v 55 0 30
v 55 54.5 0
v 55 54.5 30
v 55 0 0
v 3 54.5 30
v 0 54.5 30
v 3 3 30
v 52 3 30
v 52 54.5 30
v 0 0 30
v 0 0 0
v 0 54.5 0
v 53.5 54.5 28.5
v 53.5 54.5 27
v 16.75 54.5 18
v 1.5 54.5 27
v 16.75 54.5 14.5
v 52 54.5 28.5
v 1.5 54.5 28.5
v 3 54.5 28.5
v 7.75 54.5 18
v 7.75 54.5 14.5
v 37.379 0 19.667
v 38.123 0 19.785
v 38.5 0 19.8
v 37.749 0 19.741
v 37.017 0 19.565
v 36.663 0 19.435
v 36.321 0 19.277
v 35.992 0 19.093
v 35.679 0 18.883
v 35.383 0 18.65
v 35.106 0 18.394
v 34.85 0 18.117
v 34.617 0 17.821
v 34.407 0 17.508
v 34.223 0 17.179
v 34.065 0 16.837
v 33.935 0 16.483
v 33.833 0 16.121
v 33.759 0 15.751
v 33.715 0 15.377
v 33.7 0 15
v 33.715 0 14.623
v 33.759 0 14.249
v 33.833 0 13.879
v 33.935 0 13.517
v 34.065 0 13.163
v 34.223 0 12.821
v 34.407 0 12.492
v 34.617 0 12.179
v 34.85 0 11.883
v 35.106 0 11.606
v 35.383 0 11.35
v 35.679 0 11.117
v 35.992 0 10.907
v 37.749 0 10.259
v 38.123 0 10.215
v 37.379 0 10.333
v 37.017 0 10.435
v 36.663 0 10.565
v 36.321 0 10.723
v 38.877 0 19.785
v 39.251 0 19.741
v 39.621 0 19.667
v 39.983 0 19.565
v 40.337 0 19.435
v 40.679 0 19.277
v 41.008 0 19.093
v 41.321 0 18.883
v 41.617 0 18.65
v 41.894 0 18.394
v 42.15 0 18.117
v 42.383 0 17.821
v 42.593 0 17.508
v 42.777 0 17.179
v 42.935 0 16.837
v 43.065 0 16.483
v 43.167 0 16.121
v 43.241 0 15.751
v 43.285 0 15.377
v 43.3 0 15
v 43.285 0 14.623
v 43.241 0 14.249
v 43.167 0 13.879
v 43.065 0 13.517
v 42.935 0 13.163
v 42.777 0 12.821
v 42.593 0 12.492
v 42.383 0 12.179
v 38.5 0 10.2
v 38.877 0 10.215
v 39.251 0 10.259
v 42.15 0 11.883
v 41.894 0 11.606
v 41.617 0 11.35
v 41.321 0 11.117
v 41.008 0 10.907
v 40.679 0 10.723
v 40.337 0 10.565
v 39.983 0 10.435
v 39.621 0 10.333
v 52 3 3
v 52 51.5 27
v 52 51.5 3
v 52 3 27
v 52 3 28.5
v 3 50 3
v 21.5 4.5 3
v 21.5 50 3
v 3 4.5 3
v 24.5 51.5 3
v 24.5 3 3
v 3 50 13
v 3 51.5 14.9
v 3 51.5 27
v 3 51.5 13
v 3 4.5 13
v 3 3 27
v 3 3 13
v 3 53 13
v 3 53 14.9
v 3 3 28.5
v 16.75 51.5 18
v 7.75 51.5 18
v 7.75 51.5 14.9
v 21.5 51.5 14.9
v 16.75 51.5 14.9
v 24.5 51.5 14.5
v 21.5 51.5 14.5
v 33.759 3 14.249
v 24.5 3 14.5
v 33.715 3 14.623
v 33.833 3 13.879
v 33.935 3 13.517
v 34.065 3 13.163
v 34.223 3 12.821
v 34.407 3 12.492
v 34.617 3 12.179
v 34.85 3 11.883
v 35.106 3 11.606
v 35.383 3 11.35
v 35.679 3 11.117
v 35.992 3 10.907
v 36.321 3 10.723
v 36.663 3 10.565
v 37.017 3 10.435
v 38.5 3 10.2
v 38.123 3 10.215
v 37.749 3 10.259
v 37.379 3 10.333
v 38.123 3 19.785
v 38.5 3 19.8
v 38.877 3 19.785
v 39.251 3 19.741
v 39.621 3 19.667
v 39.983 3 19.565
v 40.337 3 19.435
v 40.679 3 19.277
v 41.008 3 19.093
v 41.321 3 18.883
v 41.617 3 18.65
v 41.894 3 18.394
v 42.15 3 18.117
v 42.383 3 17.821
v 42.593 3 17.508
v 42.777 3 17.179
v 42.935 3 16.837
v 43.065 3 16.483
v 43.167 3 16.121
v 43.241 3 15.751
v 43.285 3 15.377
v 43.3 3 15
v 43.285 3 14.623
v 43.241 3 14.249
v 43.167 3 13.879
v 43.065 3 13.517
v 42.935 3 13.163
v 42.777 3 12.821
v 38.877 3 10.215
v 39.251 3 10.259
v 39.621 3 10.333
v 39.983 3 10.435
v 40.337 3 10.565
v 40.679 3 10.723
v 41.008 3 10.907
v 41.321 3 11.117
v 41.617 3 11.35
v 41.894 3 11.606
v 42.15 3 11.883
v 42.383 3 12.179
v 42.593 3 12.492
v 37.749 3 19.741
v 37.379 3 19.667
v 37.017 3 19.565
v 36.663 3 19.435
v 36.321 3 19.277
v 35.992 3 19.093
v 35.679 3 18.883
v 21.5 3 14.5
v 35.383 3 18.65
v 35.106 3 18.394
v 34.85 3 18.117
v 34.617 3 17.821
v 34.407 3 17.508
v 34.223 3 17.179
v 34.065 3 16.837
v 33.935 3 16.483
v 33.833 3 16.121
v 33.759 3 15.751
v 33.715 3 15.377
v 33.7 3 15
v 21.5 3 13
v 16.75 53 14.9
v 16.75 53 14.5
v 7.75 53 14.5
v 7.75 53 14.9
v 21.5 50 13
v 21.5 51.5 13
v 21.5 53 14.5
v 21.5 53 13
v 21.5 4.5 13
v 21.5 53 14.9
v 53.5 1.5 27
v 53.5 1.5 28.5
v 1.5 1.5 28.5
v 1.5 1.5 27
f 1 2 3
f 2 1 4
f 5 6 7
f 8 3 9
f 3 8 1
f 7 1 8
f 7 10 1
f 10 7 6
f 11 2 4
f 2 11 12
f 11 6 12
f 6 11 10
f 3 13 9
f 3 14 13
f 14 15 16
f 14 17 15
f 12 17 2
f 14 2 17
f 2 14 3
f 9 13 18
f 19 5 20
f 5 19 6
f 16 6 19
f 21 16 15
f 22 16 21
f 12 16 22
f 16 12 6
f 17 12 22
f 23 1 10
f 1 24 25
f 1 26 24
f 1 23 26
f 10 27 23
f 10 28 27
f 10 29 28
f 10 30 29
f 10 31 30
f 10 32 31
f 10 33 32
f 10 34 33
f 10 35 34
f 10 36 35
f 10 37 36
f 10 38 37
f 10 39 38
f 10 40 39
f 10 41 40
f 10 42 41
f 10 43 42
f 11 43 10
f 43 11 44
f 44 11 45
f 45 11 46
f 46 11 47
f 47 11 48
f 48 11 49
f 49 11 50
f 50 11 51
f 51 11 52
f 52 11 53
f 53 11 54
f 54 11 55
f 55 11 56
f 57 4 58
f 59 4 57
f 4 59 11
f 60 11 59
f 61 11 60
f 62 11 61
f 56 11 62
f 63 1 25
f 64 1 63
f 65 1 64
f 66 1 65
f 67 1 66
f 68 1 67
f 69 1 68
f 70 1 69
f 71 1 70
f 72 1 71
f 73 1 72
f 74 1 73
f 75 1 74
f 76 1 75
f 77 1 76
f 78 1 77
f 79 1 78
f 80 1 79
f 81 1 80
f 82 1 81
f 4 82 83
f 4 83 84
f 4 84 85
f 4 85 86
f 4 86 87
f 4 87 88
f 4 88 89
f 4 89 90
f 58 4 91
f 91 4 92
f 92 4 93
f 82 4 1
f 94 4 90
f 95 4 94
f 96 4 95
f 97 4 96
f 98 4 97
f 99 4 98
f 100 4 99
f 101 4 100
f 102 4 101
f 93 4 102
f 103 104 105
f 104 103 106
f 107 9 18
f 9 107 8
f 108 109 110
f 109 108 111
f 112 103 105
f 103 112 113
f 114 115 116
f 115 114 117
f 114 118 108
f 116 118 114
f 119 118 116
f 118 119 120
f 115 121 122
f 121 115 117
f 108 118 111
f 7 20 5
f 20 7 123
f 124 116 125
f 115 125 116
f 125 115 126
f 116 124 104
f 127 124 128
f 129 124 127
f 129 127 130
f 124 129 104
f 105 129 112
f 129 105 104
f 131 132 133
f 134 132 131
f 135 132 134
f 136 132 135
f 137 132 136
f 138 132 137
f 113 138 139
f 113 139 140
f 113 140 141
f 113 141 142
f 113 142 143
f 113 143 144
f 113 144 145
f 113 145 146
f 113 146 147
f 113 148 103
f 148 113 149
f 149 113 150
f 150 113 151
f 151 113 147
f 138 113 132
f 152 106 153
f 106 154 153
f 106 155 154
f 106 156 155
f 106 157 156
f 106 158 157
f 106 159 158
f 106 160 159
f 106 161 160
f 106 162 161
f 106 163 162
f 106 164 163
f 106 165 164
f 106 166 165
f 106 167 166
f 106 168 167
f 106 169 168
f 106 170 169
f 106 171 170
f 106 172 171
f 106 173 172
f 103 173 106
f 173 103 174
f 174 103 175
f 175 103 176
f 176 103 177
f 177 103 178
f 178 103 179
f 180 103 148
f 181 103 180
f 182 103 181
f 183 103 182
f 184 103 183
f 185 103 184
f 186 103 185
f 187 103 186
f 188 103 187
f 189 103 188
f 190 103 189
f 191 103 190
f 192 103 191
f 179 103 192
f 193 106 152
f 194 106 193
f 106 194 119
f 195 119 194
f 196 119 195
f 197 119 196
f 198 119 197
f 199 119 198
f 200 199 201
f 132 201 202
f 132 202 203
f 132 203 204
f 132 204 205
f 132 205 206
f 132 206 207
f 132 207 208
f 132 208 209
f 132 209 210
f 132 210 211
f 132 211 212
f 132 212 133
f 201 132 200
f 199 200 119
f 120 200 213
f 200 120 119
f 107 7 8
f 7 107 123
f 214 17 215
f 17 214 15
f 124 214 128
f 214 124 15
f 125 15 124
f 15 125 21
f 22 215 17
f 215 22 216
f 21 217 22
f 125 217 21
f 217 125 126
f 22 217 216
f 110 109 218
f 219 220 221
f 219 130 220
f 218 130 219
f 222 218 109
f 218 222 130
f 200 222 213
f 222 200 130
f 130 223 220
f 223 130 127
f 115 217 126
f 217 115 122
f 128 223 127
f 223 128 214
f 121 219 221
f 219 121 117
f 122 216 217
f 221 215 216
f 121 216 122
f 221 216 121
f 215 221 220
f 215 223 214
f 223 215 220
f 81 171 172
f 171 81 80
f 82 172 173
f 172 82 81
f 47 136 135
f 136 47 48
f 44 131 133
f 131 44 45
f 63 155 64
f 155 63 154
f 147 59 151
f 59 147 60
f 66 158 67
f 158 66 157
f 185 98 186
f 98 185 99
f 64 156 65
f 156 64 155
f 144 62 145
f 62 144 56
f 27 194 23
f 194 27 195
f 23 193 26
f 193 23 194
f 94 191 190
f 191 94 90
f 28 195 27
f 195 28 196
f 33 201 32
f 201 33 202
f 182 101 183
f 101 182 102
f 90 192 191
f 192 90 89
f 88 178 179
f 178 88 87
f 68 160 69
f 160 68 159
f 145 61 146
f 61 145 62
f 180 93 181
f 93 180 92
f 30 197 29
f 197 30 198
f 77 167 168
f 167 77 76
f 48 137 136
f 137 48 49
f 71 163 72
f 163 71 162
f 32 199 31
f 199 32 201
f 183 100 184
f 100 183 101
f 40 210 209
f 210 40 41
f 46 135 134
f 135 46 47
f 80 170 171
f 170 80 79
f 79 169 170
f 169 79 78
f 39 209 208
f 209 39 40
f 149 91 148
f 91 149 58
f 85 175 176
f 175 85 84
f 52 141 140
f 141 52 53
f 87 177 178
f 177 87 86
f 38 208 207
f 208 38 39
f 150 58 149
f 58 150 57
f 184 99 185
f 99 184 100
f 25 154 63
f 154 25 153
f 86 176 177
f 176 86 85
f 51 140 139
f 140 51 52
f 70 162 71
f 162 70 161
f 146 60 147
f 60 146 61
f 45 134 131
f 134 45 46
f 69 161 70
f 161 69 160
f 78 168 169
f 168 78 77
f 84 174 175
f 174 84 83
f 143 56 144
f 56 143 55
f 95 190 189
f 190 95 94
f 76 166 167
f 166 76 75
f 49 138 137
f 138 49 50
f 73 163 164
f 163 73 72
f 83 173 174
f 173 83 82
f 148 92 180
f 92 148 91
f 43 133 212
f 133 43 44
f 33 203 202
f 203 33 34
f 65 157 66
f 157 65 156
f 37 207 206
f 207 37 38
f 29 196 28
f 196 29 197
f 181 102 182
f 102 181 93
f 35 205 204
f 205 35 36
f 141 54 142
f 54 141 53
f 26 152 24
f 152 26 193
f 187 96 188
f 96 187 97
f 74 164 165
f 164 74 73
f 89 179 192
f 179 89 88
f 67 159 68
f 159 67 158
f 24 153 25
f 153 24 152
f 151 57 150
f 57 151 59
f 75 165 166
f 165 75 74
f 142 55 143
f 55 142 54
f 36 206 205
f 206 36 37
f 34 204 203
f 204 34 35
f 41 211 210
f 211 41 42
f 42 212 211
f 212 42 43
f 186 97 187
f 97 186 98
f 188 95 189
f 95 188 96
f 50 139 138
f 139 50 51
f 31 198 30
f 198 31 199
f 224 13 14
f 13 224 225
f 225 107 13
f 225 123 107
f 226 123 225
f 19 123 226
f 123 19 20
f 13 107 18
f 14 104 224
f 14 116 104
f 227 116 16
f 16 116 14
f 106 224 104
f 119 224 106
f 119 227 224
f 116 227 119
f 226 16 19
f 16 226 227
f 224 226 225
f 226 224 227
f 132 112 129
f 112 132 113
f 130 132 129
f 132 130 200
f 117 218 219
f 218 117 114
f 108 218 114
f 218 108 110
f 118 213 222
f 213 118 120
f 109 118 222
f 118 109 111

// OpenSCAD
//  Box for Pedal Pause
//  Holds an arduino micro and a 1/4" jack
//
//  Box
//  feet
//  lid
//  reset switch access hole
//  micro usb access hold
//  1/4" jack hole
//  



$fn=80;

A = 55.0;  // width
B = 30.0;  // height
D =  3.0;  // wall thickness

E = 48.5;  // length of Arduino Micro
F = 18.5;  // width of Arduino Micro
G =  1.5;  // lip for support
H = 10.0;  // height of supports
I =  1.5;  // height of connector from bottom of board
J =  3.5;  // height of micro USB connector
K =  9.0;  // width of micro USB connector

L =  9.6;  // diameter of 1/4 jack mount
M =  1.9;  // thickness of Arduino Micro PC board

C = E+2*D;  // depth

union() {
  difference() {
    cube([A, C, B]); // solid box
    translate([D, D, D]) { cube([A-2*D, C-2*D, B]); } // hollow out box
    translate([D + (F-K)/2, C-2*D, H+D+I]) { cube([K, 3*D, J]); } // usb hole
    translate([D, C-D, H+D]) { cube([F, I, M]); } // notch for pc into side wall
    translate([0.70*A, 2*D, B/2]) { rotate([90, 0, 0]) { cylinder(h=3*D, r = L/2); }} // hole for jack
    translate([D/2, D/2, B-D]) { cube([A-D, C, D/2]); } // groove for lid
    translate([D, C-2*D, B-D]) { cube([A-2*D, 3*D, D]); } // remove back of groove
  }

  translate([F+D, 0, D])   { cube([D, C, G+H]); } // divider
  translate([D, C-D-G, D]) { cube([F, G, H]); } // support 1
  translate([D, D, D])     { cube([F, G, H]); } // support 2


}
